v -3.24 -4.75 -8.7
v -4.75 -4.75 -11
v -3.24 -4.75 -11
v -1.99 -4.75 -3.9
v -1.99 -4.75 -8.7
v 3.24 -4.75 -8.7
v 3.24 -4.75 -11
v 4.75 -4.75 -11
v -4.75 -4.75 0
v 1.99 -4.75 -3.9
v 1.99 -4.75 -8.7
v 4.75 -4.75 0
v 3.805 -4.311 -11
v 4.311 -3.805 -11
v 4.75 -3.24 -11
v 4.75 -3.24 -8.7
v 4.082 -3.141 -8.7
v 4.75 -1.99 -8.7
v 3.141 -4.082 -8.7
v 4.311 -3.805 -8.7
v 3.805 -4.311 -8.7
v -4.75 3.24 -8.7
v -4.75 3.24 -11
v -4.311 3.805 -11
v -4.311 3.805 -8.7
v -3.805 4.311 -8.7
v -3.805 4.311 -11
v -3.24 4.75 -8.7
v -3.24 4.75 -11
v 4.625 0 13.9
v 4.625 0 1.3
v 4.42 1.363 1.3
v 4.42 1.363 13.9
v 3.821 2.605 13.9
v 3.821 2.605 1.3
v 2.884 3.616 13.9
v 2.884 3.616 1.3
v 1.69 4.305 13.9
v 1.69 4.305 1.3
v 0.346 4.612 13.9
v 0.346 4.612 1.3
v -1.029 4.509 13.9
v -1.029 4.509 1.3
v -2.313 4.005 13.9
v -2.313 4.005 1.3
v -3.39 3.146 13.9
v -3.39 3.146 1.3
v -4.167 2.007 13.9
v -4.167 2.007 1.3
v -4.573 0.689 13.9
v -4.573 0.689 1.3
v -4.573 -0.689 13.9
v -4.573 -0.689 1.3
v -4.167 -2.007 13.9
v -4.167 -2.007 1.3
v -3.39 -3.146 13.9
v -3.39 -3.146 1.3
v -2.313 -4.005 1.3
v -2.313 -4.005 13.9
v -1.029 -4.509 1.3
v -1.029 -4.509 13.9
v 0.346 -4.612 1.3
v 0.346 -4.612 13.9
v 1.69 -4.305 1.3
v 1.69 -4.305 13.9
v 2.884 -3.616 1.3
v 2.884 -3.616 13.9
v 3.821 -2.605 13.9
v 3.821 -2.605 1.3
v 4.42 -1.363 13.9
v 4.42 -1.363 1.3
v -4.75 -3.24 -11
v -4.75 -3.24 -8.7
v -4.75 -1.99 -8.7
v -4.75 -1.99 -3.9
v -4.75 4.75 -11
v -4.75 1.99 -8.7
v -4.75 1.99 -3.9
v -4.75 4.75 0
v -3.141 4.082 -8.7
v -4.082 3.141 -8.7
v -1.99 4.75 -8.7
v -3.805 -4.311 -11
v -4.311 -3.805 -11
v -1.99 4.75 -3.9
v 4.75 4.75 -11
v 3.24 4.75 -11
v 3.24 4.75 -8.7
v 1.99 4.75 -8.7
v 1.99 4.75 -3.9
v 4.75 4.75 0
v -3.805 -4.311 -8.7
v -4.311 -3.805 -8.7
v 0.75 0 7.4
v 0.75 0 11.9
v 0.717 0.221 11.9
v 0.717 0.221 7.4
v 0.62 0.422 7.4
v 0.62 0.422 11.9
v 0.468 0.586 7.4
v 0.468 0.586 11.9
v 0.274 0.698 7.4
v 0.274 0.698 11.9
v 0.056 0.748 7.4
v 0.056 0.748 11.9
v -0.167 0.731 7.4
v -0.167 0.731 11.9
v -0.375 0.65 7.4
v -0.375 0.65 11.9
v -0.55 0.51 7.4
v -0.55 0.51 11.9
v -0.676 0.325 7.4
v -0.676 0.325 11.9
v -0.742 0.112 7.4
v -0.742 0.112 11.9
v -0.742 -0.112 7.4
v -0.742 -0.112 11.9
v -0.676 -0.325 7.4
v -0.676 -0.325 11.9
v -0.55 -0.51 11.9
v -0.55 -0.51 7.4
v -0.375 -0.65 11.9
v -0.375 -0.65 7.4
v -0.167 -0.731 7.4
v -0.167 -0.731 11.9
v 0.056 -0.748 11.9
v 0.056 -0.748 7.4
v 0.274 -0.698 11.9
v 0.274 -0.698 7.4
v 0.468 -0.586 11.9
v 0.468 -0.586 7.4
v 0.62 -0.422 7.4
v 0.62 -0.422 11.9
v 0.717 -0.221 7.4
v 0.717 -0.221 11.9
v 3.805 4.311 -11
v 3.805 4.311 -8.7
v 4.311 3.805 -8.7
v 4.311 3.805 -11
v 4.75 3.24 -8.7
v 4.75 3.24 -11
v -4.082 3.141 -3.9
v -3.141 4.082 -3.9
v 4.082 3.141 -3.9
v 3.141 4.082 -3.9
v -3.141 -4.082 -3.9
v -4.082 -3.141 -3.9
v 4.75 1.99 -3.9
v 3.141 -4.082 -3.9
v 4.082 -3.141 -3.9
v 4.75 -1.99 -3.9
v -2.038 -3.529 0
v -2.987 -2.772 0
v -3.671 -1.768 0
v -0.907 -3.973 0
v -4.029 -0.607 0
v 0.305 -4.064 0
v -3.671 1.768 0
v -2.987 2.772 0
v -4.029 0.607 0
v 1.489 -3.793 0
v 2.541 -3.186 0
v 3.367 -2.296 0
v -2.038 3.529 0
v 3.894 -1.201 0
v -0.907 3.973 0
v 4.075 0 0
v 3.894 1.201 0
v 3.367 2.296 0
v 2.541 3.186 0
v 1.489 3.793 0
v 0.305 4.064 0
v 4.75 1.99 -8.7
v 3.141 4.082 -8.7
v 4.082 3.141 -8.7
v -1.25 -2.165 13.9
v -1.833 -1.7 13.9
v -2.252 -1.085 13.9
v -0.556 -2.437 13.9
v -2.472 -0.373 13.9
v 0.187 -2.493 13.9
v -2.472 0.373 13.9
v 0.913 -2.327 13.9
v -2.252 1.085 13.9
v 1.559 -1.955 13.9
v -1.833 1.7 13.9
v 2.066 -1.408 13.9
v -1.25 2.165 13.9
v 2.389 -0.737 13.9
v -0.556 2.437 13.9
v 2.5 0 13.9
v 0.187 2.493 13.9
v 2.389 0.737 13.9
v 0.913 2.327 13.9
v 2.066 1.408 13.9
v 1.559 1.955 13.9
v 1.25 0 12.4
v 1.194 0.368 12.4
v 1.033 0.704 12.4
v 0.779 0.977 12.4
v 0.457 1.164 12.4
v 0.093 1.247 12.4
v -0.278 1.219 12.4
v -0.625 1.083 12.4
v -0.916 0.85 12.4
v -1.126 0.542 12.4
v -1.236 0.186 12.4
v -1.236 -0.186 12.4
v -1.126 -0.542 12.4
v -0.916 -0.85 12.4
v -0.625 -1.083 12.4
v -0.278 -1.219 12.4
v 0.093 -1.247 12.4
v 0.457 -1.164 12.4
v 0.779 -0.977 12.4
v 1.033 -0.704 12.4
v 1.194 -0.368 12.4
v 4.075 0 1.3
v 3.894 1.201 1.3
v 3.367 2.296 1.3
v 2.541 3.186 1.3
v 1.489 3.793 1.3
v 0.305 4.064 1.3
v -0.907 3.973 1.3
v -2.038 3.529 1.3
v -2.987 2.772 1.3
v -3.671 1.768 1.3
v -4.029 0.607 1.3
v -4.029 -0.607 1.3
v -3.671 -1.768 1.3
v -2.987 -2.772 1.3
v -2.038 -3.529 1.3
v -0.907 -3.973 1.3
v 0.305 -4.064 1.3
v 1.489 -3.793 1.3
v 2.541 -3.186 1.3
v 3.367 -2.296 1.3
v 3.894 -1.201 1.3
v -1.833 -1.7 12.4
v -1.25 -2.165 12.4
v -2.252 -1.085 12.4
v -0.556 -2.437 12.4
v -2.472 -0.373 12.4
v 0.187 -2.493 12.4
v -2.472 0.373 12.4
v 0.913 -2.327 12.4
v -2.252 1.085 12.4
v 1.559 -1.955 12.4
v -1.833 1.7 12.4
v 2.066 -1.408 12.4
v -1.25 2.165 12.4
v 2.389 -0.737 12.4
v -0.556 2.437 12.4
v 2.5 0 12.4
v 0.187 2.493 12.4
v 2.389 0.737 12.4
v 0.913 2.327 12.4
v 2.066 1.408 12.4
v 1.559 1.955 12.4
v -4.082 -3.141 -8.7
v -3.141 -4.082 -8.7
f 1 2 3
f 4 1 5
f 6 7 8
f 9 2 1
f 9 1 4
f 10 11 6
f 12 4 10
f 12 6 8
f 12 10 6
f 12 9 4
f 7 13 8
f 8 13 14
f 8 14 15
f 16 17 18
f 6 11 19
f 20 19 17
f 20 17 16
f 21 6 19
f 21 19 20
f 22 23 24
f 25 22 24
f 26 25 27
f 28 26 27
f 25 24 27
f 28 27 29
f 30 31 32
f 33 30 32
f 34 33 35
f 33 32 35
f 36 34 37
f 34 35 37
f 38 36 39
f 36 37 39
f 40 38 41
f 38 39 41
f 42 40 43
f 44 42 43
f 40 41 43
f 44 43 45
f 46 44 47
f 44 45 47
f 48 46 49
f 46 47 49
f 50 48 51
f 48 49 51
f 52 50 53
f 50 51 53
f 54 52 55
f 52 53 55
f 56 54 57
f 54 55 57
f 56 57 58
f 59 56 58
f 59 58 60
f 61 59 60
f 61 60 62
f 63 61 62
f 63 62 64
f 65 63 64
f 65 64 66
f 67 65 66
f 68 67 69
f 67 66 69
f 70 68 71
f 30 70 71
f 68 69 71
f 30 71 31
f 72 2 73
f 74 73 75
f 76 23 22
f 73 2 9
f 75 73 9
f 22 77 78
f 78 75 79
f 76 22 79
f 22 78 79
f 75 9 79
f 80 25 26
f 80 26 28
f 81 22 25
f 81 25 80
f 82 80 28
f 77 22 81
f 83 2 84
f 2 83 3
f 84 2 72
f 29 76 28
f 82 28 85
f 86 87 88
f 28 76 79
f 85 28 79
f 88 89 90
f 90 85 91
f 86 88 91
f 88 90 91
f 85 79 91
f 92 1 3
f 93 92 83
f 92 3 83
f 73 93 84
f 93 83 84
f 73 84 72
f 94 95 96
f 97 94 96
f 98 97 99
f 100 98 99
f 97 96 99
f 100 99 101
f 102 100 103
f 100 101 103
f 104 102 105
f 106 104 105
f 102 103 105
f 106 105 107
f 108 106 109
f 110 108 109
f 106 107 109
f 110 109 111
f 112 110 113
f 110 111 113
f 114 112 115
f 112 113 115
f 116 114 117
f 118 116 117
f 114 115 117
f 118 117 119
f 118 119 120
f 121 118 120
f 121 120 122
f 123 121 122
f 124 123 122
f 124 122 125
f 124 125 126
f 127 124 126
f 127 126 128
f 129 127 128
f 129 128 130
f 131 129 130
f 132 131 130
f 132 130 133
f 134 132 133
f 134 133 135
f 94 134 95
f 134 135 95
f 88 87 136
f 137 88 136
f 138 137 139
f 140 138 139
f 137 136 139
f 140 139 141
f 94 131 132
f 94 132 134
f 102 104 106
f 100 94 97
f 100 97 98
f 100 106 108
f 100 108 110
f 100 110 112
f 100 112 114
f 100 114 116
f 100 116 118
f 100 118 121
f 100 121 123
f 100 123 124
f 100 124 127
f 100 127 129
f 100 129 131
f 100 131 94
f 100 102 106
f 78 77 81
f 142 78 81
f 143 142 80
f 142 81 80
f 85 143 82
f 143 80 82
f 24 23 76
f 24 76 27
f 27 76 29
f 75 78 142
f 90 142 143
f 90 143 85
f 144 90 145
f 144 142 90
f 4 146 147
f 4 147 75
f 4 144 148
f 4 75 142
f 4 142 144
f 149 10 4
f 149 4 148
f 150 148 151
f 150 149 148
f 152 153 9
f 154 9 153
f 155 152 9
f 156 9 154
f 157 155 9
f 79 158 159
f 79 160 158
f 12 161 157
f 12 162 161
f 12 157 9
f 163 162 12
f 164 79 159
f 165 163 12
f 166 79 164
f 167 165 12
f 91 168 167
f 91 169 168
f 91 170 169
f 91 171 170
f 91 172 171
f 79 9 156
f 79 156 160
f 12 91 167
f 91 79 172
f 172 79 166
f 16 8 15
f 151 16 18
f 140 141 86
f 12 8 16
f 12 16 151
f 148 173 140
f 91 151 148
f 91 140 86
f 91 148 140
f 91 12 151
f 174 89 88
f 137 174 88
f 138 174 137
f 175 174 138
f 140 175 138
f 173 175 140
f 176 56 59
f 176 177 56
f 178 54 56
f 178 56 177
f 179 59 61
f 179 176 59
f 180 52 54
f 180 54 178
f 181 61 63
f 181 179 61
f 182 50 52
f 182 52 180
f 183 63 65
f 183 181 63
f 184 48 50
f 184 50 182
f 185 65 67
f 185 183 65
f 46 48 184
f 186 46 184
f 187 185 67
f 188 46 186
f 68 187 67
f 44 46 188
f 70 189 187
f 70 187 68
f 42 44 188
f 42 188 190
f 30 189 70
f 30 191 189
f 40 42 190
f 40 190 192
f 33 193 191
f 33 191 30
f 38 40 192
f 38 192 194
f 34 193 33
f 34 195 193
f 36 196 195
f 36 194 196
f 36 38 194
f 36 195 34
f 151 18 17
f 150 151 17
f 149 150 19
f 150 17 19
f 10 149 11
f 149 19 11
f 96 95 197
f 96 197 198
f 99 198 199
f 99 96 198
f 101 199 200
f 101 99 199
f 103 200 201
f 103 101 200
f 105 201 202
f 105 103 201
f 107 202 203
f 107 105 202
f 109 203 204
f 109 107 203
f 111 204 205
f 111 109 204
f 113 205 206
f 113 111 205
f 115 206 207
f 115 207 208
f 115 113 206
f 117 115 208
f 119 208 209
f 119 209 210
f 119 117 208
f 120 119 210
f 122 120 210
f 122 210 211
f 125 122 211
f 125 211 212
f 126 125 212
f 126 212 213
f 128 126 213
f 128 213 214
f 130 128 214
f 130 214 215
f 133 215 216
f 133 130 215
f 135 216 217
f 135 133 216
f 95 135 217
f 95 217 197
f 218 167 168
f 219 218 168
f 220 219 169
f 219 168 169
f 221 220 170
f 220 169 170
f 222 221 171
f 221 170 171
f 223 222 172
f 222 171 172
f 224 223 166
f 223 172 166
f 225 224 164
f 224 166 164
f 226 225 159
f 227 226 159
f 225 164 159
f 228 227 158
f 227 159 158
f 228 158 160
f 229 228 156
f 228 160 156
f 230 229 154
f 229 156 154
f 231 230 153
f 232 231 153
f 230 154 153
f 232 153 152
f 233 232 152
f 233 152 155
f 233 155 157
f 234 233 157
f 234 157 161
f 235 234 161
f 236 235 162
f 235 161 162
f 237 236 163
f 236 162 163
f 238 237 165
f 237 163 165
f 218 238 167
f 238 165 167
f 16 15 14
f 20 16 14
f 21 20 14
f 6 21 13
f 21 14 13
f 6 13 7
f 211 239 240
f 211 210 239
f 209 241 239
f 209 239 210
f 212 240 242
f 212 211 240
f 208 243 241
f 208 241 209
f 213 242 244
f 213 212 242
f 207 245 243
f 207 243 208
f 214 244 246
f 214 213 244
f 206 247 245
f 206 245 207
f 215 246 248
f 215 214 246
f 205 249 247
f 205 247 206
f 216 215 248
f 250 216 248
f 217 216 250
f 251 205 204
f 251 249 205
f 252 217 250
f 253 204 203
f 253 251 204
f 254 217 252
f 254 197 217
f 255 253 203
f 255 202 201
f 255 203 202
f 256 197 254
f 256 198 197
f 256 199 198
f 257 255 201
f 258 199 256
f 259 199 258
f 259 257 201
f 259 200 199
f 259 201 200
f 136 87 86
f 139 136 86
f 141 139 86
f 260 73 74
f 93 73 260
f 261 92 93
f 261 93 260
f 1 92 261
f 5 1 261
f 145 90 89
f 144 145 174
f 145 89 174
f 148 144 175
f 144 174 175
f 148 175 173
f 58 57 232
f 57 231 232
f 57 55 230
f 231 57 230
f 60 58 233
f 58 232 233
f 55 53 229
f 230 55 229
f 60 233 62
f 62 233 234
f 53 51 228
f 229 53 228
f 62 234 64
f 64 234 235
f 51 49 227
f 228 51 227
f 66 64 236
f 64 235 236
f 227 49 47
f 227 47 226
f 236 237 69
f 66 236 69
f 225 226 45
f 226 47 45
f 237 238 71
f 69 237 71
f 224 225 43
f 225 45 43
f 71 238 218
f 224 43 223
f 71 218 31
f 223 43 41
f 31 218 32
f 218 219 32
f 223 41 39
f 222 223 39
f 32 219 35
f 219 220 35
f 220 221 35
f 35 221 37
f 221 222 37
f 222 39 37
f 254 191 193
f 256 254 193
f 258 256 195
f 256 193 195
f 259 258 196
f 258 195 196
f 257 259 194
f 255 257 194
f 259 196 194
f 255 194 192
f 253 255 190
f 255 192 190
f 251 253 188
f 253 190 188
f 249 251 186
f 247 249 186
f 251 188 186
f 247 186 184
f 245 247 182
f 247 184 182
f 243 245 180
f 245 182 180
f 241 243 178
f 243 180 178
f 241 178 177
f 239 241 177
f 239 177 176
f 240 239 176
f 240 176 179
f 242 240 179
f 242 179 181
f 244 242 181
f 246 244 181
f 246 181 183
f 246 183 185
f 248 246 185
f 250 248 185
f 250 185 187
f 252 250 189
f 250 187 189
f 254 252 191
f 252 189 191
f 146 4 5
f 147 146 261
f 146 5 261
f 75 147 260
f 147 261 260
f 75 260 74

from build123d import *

# Parameters (mm, degrees)
SKETCH_W        = 9.5
SKETCH_H        = 9.5
PAD_DEPTH       = 11
SKETCH001_R     = 4.075
PAD001_DEPTH    = 1.3
SKETCH002_R     = 4.625
PAD002_DEPTH    = 12.6
SKETCH003_R     = 2.5
POCKET_DEPTH    = 1.5
SKETCH004_R     = 0.75
POCKET001_DEPTH = 5
SKETCH005_R     = 5.75
POCKET002_DEPTH = 2.3
SKETCH006_R     = 5.15
POCKET003_DEPTH = 4.8
CHAMFER_SIZE    = 0.5


with BuildPart() as part:
    # Sketch → Pad (new body)
    with BuildSketch(Plane.XY):
        Rectangle(SKETCH_W, SKETCH_H)
    extrude(amount=-PAD_DEPTH)

    # Sketch001 (on Face5 of Pad) → Pad001 (join)
    with BuildSketch(Plane.XY):
        Circle(SKETCH001_R)
    extrude(amount=PAD001_DEPTH)

    # Sketch002 (on Face8 of Pad001) → Pad002 (join)
    with BuildSketch(Plane.XY.offset(1.3)):
        Circle(SKETCH002_R)
    extrude(amount=PAD002_DEPTH)

    # Sketch003 (on Face3 of Pad002) → Pocket (cut)
    with BuildSketch(Plane.XY.offset(13.9)):
        Circle(SKETCH003_R)
    extrude(amount=-POCKET_DEPTH, mode=Mode.SUBTRACT)

    # Sketch004 (on Face7 of Pocket) → Pocket001 (cut)
    with BuildSketch(Plane.XY.offset(12.4)):
        Circle(SKETCH004_R)
    extrude(amount=-POCKET001_DEPTH, mode=Mode.SUBTRACT)

    # Sketch005 (on Face13 of Pocket001) → Pocket002 (cut)
    with BuildSketch(Plane(origin=(0, 0, -11), x_dir=(1, 0, 0), z_dir=(0, 0, -1))):
        Circle(SKETCH005_R)
    extrude(amount=-POCKET002_DEPTH, mode=Mode.SUBTRACT)

    # Sketch006 (on Face15 of Pocket002) → Pocket003 (cut)
    with BuildSketch(Plane(origin=(0, 0, -8.7), x_dir=(1, 0, 0), z_dir=(0, 0, -1))):
        Circle(SKETCH006_R)
    extrude(amount=-POCKET003_DEPTH, mode=Mode.SUBTRACT)

    # Chamfer
    chamfer_edges = [part.edges().sort_by_distance(p)[0] for p in [
        (-0.75, 0, 12.4),
    ]]
    chamfer(chamfer_edges, length=CHAMFER_SIZE)


solid = part.part
